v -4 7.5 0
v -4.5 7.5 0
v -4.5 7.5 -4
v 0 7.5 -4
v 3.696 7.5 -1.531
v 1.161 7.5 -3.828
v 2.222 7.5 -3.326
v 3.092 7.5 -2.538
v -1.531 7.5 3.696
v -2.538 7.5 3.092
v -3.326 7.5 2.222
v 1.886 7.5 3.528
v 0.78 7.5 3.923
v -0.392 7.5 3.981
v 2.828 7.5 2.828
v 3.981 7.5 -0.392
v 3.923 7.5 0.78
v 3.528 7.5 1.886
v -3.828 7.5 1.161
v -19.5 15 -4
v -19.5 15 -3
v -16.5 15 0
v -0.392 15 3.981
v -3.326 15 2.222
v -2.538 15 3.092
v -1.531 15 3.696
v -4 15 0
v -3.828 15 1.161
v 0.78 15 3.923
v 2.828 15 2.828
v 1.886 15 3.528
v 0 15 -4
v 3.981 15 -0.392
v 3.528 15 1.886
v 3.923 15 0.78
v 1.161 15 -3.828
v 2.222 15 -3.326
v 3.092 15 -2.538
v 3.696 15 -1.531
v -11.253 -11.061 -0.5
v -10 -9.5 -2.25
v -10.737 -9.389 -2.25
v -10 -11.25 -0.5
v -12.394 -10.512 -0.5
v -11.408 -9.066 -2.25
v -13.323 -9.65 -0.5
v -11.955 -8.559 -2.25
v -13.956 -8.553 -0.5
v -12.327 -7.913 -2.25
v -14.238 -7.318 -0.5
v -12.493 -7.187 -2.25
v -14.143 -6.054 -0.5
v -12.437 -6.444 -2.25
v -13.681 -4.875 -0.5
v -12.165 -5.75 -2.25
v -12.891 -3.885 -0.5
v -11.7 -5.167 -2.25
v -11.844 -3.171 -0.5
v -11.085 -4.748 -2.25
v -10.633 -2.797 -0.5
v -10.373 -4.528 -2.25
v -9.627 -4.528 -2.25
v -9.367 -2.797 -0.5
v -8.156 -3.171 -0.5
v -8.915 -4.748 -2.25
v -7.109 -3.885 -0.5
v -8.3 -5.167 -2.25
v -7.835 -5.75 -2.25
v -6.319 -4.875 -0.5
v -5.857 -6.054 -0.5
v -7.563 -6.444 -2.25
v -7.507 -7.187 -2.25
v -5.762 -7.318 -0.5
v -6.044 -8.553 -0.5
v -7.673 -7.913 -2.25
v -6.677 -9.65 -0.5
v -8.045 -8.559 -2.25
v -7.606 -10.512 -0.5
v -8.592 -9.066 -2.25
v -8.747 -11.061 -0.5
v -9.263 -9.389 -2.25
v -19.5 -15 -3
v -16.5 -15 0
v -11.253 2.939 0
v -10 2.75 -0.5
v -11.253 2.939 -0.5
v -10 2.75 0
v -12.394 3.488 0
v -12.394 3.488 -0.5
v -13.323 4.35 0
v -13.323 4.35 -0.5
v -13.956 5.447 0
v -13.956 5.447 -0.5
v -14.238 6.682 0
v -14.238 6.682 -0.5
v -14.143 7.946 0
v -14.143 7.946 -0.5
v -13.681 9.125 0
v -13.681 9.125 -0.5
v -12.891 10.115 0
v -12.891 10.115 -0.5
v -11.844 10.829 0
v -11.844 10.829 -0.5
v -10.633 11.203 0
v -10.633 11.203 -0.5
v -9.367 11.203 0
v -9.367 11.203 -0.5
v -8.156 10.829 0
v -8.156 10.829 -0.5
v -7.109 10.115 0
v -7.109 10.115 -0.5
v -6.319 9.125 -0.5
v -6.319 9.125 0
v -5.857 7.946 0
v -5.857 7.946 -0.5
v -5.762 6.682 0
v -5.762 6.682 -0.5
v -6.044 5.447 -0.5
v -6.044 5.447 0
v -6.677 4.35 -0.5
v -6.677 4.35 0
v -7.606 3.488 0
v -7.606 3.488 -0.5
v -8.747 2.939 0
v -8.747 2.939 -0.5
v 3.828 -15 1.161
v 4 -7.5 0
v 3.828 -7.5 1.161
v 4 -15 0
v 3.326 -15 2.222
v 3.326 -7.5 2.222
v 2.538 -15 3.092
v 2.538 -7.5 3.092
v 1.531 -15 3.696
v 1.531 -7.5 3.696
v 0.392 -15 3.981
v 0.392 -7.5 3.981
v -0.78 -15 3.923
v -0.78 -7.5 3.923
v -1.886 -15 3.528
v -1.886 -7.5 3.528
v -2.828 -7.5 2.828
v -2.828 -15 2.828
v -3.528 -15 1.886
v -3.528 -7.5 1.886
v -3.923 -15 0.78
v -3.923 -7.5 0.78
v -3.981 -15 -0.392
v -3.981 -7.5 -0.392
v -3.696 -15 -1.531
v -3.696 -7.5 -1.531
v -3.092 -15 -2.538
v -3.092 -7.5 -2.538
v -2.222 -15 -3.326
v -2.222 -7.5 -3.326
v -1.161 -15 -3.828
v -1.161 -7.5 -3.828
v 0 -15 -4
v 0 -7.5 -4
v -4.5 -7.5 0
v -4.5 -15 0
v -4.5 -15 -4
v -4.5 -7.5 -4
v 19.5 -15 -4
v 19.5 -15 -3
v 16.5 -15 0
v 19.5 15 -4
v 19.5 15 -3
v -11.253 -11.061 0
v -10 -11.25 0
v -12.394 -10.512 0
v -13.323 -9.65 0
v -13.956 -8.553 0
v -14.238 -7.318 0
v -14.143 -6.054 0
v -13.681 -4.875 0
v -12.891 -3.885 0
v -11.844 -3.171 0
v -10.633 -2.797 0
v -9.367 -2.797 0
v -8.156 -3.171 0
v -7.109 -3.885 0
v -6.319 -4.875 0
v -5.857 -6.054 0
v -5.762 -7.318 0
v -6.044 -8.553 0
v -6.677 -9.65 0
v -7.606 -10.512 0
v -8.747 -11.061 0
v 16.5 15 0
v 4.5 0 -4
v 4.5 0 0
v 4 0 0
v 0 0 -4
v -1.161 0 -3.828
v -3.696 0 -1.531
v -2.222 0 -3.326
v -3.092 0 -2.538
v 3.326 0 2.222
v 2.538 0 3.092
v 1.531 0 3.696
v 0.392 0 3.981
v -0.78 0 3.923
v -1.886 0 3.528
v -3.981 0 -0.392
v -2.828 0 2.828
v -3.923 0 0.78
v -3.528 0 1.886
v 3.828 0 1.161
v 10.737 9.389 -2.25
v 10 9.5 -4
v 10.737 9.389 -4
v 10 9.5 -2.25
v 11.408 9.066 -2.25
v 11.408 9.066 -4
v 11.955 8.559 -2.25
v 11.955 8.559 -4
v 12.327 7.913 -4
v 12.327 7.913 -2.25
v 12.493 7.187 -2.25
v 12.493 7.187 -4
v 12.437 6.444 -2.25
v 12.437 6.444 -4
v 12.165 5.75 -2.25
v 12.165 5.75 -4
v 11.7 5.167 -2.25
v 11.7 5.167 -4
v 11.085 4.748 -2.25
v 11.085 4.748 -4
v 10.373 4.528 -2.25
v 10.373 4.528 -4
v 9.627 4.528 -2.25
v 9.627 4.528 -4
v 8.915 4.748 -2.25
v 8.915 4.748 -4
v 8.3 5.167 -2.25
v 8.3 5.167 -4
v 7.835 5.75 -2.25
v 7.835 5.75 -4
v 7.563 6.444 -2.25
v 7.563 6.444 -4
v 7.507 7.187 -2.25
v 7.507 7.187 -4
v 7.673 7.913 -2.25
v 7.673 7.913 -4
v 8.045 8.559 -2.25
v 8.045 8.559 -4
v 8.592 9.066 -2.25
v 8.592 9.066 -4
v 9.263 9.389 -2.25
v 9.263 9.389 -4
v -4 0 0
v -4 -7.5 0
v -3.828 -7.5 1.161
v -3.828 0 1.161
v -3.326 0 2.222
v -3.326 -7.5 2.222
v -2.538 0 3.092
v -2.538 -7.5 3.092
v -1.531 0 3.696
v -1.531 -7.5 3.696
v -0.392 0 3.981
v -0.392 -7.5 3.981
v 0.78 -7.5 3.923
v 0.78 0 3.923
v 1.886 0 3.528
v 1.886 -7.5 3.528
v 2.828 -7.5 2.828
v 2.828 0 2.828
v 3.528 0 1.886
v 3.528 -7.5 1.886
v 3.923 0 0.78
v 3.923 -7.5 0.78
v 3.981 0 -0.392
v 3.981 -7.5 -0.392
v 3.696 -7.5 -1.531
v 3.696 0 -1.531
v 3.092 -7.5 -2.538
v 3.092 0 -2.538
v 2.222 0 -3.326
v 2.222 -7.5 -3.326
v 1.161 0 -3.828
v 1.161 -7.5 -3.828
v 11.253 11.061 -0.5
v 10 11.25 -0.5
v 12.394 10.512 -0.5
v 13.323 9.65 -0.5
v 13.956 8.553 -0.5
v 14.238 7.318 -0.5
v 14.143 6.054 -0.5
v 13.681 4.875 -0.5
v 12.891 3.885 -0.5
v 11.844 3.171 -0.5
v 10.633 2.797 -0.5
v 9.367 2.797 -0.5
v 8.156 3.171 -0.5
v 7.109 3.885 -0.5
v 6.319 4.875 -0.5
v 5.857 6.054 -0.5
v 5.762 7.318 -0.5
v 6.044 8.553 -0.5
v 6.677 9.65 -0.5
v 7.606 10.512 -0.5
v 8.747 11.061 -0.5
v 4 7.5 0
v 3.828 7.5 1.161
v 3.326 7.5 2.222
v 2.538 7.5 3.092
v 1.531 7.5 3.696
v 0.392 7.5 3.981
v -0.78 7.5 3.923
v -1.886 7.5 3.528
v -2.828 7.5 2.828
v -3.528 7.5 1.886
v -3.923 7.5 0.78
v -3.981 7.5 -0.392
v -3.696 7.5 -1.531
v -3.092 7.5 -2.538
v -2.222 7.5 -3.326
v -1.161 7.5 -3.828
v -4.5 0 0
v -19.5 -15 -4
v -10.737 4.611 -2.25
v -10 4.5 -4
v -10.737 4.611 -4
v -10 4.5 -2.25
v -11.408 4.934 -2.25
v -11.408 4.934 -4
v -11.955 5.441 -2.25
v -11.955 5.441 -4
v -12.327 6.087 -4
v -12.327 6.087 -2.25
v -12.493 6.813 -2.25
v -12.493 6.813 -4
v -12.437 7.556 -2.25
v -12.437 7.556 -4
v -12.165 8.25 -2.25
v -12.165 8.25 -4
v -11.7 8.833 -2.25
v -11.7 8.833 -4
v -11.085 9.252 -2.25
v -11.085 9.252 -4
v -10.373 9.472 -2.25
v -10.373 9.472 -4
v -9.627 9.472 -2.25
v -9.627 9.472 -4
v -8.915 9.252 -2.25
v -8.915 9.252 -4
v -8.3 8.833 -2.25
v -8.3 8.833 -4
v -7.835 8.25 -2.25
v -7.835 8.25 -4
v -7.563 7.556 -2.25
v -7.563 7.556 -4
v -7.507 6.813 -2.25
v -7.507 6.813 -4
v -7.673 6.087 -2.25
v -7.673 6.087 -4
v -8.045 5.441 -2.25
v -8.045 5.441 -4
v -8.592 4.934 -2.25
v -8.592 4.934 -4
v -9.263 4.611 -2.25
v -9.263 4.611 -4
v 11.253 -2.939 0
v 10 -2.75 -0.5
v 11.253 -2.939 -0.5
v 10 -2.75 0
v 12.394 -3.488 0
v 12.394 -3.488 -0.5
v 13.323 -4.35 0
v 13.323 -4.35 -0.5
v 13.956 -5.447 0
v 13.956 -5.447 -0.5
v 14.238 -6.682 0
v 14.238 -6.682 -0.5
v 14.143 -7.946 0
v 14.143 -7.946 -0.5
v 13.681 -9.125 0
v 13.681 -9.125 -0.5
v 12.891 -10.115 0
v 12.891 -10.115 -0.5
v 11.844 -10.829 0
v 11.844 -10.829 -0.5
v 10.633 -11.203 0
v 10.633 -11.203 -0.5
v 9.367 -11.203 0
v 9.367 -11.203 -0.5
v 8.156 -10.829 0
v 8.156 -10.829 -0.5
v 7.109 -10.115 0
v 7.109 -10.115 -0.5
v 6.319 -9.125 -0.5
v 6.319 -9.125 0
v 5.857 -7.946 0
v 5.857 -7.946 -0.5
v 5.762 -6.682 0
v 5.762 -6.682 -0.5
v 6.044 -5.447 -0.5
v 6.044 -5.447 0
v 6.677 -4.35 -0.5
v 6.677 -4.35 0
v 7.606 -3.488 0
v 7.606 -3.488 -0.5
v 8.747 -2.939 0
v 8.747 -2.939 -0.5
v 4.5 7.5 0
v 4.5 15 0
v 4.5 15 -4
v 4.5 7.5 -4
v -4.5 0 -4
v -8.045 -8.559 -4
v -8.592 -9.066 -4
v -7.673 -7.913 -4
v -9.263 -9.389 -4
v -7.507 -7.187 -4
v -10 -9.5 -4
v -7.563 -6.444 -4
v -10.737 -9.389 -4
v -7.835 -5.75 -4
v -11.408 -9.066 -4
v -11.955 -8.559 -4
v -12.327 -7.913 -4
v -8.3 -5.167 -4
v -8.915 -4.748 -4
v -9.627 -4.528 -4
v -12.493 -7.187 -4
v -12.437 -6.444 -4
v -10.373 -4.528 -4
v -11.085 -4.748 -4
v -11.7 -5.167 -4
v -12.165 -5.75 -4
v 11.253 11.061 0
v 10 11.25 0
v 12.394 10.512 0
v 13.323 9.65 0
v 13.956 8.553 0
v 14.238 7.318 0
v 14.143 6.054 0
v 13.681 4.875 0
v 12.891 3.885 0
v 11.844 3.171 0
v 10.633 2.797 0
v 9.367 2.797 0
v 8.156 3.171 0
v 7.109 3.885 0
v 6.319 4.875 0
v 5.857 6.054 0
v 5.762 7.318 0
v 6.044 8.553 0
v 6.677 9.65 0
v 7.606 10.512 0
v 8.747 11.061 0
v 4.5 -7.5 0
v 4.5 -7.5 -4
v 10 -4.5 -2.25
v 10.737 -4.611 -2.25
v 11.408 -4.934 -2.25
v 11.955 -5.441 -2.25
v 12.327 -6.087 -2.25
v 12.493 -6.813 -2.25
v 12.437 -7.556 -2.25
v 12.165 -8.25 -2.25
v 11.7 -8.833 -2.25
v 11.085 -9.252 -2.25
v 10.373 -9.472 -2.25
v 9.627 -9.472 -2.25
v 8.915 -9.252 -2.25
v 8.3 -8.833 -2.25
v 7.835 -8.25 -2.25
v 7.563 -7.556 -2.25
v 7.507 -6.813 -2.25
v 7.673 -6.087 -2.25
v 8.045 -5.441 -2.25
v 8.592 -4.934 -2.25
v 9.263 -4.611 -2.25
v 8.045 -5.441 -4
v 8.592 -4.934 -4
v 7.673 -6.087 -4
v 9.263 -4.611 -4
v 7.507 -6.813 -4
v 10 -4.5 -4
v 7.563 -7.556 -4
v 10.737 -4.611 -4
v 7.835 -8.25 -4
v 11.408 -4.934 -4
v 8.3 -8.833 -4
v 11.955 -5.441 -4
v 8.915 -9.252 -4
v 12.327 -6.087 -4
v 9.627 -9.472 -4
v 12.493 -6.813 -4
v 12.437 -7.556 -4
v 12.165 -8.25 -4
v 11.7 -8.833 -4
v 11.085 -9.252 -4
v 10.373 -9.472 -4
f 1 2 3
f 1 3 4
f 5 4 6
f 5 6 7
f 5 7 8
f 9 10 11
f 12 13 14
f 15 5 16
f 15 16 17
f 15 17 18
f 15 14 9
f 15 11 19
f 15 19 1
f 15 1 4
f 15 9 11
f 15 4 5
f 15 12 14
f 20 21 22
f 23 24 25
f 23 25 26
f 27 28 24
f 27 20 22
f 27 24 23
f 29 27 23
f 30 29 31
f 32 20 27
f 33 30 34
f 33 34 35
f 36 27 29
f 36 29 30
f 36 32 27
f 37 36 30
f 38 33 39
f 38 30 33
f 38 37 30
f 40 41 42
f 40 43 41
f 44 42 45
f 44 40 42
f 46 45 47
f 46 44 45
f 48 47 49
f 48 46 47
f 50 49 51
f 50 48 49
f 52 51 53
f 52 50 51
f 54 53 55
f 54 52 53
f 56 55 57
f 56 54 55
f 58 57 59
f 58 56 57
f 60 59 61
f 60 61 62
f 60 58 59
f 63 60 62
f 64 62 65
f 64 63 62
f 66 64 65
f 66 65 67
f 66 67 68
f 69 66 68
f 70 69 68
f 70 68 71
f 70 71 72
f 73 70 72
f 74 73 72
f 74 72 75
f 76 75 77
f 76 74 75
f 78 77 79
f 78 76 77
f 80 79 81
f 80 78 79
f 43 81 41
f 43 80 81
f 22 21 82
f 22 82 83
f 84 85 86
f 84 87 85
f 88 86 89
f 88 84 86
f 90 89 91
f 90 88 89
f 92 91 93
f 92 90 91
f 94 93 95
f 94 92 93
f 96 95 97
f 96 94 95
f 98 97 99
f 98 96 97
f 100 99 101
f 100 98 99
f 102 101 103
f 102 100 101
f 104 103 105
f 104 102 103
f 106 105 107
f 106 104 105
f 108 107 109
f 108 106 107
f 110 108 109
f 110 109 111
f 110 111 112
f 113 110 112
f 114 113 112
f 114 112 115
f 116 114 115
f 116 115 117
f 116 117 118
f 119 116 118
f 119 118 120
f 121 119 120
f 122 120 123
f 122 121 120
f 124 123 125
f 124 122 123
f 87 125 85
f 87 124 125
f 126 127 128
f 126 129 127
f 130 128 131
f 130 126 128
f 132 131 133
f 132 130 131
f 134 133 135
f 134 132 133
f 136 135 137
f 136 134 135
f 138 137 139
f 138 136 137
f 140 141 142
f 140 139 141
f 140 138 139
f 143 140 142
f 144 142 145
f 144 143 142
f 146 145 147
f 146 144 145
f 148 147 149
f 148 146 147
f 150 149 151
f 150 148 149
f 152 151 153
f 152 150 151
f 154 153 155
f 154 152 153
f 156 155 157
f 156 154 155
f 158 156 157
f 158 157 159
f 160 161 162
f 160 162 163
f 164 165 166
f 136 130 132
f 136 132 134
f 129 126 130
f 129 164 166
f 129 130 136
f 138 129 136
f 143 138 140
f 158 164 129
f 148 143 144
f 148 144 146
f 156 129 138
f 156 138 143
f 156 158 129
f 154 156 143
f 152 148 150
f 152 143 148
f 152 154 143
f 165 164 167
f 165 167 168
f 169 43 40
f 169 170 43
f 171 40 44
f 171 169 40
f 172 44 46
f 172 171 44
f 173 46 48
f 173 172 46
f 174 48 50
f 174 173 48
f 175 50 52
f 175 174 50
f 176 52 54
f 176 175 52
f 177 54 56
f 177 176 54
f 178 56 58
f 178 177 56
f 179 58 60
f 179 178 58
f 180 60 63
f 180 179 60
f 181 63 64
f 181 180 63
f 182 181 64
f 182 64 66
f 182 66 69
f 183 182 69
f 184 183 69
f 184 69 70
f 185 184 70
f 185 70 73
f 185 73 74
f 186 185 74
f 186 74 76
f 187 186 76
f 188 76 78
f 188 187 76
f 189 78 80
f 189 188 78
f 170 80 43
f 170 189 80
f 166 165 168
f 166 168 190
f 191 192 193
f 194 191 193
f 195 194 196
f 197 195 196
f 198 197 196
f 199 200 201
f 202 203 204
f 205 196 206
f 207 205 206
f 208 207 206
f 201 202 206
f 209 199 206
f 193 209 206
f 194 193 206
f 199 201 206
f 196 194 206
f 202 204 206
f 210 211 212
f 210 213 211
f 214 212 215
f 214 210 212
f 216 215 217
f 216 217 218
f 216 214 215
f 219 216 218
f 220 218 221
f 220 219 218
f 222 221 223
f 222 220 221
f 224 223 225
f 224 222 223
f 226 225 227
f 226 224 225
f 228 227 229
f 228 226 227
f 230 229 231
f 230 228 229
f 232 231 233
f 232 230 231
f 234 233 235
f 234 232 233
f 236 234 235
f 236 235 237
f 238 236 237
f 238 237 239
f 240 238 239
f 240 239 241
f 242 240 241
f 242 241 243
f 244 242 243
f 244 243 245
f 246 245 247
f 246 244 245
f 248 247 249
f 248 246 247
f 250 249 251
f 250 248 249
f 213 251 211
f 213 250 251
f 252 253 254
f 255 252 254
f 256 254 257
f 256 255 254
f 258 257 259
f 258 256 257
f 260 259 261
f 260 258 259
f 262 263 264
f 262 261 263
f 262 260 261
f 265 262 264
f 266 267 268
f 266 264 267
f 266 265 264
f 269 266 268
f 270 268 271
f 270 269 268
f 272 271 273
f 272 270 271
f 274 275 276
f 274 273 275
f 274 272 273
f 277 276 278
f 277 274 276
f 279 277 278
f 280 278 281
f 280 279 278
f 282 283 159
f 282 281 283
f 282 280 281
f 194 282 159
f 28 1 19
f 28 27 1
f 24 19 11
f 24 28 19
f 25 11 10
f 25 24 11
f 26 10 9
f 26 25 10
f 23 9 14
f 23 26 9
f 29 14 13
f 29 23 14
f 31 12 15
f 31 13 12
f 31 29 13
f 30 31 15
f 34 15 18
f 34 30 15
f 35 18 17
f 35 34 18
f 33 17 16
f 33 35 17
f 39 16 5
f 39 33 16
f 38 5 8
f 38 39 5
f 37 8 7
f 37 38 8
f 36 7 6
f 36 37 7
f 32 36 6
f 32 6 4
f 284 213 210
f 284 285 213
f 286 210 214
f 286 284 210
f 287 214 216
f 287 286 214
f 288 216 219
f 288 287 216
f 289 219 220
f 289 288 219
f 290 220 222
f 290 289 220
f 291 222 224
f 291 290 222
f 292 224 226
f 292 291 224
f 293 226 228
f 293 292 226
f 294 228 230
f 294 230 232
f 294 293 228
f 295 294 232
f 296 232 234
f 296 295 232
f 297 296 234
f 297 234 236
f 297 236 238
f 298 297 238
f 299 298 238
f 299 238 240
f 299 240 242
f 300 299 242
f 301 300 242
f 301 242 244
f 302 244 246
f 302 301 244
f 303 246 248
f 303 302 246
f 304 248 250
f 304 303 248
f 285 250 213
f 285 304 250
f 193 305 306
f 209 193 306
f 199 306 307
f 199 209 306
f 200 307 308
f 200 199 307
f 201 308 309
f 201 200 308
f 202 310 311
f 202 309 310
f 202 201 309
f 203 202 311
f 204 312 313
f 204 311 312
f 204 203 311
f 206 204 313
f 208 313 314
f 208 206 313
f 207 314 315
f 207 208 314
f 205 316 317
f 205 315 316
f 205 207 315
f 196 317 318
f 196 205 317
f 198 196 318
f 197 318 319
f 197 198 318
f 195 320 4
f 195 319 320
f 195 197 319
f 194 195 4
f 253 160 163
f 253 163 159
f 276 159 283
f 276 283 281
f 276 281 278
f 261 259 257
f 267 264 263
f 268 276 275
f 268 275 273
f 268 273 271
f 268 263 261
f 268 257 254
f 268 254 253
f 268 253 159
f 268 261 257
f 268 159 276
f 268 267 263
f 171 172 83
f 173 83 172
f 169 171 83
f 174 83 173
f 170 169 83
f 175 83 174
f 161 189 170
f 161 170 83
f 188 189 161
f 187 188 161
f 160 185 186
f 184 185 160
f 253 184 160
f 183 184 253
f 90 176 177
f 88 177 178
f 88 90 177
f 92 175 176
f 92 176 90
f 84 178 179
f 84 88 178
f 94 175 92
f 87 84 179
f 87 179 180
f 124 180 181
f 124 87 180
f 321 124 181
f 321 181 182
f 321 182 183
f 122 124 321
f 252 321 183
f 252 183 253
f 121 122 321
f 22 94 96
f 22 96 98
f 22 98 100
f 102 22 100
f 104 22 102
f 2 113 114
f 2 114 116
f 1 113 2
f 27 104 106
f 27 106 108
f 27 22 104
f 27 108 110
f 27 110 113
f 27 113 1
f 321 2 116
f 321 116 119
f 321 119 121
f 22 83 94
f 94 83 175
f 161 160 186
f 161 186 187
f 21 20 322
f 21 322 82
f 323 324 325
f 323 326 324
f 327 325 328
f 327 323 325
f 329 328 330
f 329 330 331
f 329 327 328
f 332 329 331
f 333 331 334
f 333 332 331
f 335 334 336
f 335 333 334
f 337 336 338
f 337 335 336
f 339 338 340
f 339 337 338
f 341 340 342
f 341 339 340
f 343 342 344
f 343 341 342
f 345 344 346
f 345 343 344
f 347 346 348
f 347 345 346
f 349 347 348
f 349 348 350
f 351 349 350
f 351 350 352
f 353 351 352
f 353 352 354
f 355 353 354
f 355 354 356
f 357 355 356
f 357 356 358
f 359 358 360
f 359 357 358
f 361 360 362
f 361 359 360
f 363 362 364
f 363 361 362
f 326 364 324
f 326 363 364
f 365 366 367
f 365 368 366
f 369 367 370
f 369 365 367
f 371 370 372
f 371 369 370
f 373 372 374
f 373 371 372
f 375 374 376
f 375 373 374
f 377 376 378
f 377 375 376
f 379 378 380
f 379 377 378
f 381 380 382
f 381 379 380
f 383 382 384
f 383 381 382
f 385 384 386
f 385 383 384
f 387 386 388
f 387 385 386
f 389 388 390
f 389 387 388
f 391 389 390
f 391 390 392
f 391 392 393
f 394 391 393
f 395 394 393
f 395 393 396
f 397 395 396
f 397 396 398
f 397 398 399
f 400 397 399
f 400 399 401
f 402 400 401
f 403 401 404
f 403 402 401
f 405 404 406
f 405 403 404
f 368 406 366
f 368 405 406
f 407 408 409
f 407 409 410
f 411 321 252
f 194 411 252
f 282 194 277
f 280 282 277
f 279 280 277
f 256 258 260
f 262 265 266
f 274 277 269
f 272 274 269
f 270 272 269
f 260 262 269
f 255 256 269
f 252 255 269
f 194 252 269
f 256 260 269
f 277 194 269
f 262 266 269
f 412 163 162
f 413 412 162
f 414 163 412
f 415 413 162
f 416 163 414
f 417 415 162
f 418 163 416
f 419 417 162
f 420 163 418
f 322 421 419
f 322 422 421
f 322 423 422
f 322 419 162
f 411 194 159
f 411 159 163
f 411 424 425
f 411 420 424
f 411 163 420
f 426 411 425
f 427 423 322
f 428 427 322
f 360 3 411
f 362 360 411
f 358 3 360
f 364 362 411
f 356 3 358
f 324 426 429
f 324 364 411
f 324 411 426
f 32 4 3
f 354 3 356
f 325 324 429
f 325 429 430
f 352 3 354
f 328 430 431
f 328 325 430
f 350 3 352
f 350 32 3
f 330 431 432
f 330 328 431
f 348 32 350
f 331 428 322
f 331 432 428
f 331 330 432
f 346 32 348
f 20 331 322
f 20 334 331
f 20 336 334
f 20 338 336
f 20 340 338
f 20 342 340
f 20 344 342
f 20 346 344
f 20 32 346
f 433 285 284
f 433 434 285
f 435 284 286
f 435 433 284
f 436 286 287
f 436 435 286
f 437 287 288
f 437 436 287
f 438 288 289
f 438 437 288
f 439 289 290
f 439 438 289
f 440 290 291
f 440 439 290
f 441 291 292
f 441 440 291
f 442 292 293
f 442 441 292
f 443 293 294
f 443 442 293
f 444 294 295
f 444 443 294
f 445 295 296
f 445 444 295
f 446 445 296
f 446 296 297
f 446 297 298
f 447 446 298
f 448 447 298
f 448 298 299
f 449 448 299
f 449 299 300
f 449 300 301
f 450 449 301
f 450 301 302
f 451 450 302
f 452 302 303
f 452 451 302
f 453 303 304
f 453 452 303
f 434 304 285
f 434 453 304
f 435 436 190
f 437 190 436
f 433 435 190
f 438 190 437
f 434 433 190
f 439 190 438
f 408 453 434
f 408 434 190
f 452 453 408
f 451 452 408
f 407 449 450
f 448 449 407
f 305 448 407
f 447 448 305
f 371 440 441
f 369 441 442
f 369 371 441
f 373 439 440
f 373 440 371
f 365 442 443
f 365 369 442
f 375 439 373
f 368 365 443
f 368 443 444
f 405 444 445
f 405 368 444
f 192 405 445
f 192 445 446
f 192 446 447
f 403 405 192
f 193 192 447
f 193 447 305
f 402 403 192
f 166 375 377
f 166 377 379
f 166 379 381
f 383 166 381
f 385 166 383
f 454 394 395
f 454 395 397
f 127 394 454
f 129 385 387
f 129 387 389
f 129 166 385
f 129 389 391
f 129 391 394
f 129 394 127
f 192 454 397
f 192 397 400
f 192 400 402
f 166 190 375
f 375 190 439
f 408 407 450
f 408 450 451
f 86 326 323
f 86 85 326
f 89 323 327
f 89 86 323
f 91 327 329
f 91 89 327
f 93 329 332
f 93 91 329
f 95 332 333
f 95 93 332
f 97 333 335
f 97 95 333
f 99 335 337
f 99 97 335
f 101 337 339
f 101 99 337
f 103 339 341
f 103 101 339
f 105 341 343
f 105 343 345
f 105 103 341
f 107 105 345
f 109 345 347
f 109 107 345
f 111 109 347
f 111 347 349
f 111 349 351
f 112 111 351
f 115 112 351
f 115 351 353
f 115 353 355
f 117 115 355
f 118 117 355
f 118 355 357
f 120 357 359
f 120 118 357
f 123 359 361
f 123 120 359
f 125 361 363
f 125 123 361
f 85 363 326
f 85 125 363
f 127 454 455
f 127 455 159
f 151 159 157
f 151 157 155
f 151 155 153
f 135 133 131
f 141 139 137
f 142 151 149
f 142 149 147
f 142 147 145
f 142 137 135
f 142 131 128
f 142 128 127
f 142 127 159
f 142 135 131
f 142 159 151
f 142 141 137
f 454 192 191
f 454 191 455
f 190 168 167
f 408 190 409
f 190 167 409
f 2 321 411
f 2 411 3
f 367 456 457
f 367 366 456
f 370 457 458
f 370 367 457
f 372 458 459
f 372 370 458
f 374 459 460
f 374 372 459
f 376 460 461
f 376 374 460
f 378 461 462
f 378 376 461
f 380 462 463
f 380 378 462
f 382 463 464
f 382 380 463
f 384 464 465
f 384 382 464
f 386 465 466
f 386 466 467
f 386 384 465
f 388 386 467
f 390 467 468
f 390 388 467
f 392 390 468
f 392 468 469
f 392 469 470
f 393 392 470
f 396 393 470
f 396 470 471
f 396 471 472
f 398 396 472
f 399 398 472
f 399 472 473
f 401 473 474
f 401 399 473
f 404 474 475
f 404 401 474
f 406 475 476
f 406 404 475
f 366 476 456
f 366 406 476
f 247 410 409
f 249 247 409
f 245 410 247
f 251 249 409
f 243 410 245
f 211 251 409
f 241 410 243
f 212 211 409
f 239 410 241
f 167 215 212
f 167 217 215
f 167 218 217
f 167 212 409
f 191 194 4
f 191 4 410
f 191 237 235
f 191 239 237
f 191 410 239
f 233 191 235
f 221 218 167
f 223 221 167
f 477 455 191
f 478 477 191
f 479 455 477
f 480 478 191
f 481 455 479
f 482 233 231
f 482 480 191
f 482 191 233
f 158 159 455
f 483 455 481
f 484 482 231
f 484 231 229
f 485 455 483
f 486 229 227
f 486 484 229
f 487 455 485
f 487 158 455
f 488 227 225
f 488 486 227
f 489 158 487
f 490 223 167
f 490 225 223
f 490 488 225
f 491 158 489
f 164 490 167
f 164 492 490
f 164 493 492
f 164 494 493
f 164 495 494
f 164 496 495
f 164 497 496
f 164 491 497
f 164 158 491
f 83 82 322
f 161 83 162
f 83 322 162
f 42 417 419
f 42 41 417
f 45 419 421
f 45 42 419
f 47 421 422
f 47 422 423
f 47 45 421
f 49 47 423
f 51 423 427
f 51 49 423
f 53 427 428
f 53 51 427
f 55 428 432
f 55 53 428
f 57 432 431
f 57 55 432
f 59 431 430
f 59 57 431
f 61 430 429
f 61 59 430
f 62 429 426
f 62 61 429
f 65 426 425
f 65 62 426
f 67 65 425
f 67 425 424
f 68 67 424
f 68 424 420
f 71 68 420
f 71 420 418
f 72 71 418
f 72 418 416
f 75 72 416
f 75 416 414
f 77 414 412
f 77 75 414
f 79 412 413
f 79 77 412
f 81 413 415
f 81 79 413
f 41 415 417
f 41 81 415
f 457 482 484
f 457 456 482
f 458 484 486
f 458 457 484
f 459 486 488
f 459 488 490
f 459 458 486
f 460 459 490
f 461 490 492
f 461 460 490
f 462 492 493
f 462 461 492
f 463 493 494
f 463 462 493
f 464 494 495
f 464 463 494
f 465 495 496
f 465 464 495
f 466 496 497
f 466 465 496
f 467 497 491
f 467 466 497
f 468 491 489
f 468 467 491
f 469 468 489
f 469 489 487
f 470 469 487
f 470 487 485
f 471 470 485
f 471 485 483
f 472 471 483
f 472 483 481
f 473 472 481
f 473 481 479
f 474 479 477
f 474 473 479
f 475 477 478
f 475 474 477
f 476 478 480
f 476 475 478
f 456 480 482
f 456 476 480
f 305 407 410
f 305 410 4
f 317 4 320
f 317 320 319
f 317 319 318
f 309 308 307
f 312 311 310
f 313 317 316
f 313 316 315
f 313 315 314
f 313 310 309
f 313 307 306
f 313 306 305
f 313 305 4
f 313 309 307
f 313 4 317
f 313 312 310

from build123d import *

# Parameters (mm, degrees)
EXTRUDE_1_DEPTH            = 15
SKETCH_3_W                 = 8.5
SKETCH_3_H                 = 7.5
CUT_EXTRUDE_1_DEPTH        = 5
CUT_EXTRUDE_1_DEPTH_BACK   = 5
HOLE_WIZARD_M41_AT_2_COUNT = 2
HOLE_WIZARD_M41_AT_2_PITCH = 14
PATTERN_CIRCULAR_1_COUNT   = 2


with BuildPart() as part:
    # Эскиз1 → Бобышка-Вытянуть1 (new body, symmetric)
    with BuildSketch(Plane(origin=(0, 0, 0), x_dir=(1, 0, 0), z_dir=(0, 1, 0))):
        with BuildLine():
            Line((0, 4), (-19.5, 4))
            Line((-19.5, 4), (-19.5, 3))
            Line((-19.5, 3), (-16.5, 0))
            Line((-16.5, 0), (-4, 0))
            ThreePointArc((-4, 0), (2.828427125, -2.828427125), (0, 4))
        make_face()
    extrude(amount=EXTRUDE_1_DEPTH, both=True)

    # Эскиз3 → Вырез-Вытянуть1 (cut, two sides)
    with BuildSketch(Plane.XY) as cut_extrude_1_sk:
        with Locations((-0.25, 3.75)):
            Rectangle(SKETCH_3_W, SKETCH_3_H)
        with Locations((-0.25, -11.25)):
            Rectangle(SKETCH_3_W, SKETCH_3_H)
    extrude(amount=CUT_EXTRUDE_1_DEPTH, mode=Mode.SUBTRACT)
    extrude(cut_extrude_1_sk.sketch, amount=-CUT_EXTRUDE_1_DEPTH_BACK, mode=Mode.SUBTRACT)

    # Эскиз6 → Зенковка для винта с полупотайной головкой M41 (revolve, cut)
    with BuildSketch(Plane(origin=(-10, 7, 0), x_dir=(0, -1, 0), z_dir=(1, 0, 0))):
        Polygon((0, 0), (0, 4), (2.5, 4), (2.5, 2.25), (4.25, 0.5), (4.25, 0), align=None)
    hole_wizard_m41 = revolve(axis=Axis((-10, 7, 6.35), (0, 0, -1)), mode=Mode.SUBTRACT)

    # Зенковка для винта с полупотайной головкой M41 at 2: Зенковка для винта с полупотайной головкой M41 ×2
    with Locations(*[(0, -i * HOLE_WIZARD_M41_AT_2_PITCH, 0) for i in range(1, HOLE_WIZARD_M41_AT_2_COUNT)]):
        add(hole_wizard_m41, mode=Mode.SUBTRACT)


with BuildPart() as pattern_circular_1_1:
    # Круговой массив1: pattern copy
    add(part.part.rotate(Axis((0, 0, 0), (0, 0, 1)), 1 * 360 / PATTERN_CIRCULAR_1_COUNT))


solid = Compound([part.part, pattern_circular_1_1.part])
